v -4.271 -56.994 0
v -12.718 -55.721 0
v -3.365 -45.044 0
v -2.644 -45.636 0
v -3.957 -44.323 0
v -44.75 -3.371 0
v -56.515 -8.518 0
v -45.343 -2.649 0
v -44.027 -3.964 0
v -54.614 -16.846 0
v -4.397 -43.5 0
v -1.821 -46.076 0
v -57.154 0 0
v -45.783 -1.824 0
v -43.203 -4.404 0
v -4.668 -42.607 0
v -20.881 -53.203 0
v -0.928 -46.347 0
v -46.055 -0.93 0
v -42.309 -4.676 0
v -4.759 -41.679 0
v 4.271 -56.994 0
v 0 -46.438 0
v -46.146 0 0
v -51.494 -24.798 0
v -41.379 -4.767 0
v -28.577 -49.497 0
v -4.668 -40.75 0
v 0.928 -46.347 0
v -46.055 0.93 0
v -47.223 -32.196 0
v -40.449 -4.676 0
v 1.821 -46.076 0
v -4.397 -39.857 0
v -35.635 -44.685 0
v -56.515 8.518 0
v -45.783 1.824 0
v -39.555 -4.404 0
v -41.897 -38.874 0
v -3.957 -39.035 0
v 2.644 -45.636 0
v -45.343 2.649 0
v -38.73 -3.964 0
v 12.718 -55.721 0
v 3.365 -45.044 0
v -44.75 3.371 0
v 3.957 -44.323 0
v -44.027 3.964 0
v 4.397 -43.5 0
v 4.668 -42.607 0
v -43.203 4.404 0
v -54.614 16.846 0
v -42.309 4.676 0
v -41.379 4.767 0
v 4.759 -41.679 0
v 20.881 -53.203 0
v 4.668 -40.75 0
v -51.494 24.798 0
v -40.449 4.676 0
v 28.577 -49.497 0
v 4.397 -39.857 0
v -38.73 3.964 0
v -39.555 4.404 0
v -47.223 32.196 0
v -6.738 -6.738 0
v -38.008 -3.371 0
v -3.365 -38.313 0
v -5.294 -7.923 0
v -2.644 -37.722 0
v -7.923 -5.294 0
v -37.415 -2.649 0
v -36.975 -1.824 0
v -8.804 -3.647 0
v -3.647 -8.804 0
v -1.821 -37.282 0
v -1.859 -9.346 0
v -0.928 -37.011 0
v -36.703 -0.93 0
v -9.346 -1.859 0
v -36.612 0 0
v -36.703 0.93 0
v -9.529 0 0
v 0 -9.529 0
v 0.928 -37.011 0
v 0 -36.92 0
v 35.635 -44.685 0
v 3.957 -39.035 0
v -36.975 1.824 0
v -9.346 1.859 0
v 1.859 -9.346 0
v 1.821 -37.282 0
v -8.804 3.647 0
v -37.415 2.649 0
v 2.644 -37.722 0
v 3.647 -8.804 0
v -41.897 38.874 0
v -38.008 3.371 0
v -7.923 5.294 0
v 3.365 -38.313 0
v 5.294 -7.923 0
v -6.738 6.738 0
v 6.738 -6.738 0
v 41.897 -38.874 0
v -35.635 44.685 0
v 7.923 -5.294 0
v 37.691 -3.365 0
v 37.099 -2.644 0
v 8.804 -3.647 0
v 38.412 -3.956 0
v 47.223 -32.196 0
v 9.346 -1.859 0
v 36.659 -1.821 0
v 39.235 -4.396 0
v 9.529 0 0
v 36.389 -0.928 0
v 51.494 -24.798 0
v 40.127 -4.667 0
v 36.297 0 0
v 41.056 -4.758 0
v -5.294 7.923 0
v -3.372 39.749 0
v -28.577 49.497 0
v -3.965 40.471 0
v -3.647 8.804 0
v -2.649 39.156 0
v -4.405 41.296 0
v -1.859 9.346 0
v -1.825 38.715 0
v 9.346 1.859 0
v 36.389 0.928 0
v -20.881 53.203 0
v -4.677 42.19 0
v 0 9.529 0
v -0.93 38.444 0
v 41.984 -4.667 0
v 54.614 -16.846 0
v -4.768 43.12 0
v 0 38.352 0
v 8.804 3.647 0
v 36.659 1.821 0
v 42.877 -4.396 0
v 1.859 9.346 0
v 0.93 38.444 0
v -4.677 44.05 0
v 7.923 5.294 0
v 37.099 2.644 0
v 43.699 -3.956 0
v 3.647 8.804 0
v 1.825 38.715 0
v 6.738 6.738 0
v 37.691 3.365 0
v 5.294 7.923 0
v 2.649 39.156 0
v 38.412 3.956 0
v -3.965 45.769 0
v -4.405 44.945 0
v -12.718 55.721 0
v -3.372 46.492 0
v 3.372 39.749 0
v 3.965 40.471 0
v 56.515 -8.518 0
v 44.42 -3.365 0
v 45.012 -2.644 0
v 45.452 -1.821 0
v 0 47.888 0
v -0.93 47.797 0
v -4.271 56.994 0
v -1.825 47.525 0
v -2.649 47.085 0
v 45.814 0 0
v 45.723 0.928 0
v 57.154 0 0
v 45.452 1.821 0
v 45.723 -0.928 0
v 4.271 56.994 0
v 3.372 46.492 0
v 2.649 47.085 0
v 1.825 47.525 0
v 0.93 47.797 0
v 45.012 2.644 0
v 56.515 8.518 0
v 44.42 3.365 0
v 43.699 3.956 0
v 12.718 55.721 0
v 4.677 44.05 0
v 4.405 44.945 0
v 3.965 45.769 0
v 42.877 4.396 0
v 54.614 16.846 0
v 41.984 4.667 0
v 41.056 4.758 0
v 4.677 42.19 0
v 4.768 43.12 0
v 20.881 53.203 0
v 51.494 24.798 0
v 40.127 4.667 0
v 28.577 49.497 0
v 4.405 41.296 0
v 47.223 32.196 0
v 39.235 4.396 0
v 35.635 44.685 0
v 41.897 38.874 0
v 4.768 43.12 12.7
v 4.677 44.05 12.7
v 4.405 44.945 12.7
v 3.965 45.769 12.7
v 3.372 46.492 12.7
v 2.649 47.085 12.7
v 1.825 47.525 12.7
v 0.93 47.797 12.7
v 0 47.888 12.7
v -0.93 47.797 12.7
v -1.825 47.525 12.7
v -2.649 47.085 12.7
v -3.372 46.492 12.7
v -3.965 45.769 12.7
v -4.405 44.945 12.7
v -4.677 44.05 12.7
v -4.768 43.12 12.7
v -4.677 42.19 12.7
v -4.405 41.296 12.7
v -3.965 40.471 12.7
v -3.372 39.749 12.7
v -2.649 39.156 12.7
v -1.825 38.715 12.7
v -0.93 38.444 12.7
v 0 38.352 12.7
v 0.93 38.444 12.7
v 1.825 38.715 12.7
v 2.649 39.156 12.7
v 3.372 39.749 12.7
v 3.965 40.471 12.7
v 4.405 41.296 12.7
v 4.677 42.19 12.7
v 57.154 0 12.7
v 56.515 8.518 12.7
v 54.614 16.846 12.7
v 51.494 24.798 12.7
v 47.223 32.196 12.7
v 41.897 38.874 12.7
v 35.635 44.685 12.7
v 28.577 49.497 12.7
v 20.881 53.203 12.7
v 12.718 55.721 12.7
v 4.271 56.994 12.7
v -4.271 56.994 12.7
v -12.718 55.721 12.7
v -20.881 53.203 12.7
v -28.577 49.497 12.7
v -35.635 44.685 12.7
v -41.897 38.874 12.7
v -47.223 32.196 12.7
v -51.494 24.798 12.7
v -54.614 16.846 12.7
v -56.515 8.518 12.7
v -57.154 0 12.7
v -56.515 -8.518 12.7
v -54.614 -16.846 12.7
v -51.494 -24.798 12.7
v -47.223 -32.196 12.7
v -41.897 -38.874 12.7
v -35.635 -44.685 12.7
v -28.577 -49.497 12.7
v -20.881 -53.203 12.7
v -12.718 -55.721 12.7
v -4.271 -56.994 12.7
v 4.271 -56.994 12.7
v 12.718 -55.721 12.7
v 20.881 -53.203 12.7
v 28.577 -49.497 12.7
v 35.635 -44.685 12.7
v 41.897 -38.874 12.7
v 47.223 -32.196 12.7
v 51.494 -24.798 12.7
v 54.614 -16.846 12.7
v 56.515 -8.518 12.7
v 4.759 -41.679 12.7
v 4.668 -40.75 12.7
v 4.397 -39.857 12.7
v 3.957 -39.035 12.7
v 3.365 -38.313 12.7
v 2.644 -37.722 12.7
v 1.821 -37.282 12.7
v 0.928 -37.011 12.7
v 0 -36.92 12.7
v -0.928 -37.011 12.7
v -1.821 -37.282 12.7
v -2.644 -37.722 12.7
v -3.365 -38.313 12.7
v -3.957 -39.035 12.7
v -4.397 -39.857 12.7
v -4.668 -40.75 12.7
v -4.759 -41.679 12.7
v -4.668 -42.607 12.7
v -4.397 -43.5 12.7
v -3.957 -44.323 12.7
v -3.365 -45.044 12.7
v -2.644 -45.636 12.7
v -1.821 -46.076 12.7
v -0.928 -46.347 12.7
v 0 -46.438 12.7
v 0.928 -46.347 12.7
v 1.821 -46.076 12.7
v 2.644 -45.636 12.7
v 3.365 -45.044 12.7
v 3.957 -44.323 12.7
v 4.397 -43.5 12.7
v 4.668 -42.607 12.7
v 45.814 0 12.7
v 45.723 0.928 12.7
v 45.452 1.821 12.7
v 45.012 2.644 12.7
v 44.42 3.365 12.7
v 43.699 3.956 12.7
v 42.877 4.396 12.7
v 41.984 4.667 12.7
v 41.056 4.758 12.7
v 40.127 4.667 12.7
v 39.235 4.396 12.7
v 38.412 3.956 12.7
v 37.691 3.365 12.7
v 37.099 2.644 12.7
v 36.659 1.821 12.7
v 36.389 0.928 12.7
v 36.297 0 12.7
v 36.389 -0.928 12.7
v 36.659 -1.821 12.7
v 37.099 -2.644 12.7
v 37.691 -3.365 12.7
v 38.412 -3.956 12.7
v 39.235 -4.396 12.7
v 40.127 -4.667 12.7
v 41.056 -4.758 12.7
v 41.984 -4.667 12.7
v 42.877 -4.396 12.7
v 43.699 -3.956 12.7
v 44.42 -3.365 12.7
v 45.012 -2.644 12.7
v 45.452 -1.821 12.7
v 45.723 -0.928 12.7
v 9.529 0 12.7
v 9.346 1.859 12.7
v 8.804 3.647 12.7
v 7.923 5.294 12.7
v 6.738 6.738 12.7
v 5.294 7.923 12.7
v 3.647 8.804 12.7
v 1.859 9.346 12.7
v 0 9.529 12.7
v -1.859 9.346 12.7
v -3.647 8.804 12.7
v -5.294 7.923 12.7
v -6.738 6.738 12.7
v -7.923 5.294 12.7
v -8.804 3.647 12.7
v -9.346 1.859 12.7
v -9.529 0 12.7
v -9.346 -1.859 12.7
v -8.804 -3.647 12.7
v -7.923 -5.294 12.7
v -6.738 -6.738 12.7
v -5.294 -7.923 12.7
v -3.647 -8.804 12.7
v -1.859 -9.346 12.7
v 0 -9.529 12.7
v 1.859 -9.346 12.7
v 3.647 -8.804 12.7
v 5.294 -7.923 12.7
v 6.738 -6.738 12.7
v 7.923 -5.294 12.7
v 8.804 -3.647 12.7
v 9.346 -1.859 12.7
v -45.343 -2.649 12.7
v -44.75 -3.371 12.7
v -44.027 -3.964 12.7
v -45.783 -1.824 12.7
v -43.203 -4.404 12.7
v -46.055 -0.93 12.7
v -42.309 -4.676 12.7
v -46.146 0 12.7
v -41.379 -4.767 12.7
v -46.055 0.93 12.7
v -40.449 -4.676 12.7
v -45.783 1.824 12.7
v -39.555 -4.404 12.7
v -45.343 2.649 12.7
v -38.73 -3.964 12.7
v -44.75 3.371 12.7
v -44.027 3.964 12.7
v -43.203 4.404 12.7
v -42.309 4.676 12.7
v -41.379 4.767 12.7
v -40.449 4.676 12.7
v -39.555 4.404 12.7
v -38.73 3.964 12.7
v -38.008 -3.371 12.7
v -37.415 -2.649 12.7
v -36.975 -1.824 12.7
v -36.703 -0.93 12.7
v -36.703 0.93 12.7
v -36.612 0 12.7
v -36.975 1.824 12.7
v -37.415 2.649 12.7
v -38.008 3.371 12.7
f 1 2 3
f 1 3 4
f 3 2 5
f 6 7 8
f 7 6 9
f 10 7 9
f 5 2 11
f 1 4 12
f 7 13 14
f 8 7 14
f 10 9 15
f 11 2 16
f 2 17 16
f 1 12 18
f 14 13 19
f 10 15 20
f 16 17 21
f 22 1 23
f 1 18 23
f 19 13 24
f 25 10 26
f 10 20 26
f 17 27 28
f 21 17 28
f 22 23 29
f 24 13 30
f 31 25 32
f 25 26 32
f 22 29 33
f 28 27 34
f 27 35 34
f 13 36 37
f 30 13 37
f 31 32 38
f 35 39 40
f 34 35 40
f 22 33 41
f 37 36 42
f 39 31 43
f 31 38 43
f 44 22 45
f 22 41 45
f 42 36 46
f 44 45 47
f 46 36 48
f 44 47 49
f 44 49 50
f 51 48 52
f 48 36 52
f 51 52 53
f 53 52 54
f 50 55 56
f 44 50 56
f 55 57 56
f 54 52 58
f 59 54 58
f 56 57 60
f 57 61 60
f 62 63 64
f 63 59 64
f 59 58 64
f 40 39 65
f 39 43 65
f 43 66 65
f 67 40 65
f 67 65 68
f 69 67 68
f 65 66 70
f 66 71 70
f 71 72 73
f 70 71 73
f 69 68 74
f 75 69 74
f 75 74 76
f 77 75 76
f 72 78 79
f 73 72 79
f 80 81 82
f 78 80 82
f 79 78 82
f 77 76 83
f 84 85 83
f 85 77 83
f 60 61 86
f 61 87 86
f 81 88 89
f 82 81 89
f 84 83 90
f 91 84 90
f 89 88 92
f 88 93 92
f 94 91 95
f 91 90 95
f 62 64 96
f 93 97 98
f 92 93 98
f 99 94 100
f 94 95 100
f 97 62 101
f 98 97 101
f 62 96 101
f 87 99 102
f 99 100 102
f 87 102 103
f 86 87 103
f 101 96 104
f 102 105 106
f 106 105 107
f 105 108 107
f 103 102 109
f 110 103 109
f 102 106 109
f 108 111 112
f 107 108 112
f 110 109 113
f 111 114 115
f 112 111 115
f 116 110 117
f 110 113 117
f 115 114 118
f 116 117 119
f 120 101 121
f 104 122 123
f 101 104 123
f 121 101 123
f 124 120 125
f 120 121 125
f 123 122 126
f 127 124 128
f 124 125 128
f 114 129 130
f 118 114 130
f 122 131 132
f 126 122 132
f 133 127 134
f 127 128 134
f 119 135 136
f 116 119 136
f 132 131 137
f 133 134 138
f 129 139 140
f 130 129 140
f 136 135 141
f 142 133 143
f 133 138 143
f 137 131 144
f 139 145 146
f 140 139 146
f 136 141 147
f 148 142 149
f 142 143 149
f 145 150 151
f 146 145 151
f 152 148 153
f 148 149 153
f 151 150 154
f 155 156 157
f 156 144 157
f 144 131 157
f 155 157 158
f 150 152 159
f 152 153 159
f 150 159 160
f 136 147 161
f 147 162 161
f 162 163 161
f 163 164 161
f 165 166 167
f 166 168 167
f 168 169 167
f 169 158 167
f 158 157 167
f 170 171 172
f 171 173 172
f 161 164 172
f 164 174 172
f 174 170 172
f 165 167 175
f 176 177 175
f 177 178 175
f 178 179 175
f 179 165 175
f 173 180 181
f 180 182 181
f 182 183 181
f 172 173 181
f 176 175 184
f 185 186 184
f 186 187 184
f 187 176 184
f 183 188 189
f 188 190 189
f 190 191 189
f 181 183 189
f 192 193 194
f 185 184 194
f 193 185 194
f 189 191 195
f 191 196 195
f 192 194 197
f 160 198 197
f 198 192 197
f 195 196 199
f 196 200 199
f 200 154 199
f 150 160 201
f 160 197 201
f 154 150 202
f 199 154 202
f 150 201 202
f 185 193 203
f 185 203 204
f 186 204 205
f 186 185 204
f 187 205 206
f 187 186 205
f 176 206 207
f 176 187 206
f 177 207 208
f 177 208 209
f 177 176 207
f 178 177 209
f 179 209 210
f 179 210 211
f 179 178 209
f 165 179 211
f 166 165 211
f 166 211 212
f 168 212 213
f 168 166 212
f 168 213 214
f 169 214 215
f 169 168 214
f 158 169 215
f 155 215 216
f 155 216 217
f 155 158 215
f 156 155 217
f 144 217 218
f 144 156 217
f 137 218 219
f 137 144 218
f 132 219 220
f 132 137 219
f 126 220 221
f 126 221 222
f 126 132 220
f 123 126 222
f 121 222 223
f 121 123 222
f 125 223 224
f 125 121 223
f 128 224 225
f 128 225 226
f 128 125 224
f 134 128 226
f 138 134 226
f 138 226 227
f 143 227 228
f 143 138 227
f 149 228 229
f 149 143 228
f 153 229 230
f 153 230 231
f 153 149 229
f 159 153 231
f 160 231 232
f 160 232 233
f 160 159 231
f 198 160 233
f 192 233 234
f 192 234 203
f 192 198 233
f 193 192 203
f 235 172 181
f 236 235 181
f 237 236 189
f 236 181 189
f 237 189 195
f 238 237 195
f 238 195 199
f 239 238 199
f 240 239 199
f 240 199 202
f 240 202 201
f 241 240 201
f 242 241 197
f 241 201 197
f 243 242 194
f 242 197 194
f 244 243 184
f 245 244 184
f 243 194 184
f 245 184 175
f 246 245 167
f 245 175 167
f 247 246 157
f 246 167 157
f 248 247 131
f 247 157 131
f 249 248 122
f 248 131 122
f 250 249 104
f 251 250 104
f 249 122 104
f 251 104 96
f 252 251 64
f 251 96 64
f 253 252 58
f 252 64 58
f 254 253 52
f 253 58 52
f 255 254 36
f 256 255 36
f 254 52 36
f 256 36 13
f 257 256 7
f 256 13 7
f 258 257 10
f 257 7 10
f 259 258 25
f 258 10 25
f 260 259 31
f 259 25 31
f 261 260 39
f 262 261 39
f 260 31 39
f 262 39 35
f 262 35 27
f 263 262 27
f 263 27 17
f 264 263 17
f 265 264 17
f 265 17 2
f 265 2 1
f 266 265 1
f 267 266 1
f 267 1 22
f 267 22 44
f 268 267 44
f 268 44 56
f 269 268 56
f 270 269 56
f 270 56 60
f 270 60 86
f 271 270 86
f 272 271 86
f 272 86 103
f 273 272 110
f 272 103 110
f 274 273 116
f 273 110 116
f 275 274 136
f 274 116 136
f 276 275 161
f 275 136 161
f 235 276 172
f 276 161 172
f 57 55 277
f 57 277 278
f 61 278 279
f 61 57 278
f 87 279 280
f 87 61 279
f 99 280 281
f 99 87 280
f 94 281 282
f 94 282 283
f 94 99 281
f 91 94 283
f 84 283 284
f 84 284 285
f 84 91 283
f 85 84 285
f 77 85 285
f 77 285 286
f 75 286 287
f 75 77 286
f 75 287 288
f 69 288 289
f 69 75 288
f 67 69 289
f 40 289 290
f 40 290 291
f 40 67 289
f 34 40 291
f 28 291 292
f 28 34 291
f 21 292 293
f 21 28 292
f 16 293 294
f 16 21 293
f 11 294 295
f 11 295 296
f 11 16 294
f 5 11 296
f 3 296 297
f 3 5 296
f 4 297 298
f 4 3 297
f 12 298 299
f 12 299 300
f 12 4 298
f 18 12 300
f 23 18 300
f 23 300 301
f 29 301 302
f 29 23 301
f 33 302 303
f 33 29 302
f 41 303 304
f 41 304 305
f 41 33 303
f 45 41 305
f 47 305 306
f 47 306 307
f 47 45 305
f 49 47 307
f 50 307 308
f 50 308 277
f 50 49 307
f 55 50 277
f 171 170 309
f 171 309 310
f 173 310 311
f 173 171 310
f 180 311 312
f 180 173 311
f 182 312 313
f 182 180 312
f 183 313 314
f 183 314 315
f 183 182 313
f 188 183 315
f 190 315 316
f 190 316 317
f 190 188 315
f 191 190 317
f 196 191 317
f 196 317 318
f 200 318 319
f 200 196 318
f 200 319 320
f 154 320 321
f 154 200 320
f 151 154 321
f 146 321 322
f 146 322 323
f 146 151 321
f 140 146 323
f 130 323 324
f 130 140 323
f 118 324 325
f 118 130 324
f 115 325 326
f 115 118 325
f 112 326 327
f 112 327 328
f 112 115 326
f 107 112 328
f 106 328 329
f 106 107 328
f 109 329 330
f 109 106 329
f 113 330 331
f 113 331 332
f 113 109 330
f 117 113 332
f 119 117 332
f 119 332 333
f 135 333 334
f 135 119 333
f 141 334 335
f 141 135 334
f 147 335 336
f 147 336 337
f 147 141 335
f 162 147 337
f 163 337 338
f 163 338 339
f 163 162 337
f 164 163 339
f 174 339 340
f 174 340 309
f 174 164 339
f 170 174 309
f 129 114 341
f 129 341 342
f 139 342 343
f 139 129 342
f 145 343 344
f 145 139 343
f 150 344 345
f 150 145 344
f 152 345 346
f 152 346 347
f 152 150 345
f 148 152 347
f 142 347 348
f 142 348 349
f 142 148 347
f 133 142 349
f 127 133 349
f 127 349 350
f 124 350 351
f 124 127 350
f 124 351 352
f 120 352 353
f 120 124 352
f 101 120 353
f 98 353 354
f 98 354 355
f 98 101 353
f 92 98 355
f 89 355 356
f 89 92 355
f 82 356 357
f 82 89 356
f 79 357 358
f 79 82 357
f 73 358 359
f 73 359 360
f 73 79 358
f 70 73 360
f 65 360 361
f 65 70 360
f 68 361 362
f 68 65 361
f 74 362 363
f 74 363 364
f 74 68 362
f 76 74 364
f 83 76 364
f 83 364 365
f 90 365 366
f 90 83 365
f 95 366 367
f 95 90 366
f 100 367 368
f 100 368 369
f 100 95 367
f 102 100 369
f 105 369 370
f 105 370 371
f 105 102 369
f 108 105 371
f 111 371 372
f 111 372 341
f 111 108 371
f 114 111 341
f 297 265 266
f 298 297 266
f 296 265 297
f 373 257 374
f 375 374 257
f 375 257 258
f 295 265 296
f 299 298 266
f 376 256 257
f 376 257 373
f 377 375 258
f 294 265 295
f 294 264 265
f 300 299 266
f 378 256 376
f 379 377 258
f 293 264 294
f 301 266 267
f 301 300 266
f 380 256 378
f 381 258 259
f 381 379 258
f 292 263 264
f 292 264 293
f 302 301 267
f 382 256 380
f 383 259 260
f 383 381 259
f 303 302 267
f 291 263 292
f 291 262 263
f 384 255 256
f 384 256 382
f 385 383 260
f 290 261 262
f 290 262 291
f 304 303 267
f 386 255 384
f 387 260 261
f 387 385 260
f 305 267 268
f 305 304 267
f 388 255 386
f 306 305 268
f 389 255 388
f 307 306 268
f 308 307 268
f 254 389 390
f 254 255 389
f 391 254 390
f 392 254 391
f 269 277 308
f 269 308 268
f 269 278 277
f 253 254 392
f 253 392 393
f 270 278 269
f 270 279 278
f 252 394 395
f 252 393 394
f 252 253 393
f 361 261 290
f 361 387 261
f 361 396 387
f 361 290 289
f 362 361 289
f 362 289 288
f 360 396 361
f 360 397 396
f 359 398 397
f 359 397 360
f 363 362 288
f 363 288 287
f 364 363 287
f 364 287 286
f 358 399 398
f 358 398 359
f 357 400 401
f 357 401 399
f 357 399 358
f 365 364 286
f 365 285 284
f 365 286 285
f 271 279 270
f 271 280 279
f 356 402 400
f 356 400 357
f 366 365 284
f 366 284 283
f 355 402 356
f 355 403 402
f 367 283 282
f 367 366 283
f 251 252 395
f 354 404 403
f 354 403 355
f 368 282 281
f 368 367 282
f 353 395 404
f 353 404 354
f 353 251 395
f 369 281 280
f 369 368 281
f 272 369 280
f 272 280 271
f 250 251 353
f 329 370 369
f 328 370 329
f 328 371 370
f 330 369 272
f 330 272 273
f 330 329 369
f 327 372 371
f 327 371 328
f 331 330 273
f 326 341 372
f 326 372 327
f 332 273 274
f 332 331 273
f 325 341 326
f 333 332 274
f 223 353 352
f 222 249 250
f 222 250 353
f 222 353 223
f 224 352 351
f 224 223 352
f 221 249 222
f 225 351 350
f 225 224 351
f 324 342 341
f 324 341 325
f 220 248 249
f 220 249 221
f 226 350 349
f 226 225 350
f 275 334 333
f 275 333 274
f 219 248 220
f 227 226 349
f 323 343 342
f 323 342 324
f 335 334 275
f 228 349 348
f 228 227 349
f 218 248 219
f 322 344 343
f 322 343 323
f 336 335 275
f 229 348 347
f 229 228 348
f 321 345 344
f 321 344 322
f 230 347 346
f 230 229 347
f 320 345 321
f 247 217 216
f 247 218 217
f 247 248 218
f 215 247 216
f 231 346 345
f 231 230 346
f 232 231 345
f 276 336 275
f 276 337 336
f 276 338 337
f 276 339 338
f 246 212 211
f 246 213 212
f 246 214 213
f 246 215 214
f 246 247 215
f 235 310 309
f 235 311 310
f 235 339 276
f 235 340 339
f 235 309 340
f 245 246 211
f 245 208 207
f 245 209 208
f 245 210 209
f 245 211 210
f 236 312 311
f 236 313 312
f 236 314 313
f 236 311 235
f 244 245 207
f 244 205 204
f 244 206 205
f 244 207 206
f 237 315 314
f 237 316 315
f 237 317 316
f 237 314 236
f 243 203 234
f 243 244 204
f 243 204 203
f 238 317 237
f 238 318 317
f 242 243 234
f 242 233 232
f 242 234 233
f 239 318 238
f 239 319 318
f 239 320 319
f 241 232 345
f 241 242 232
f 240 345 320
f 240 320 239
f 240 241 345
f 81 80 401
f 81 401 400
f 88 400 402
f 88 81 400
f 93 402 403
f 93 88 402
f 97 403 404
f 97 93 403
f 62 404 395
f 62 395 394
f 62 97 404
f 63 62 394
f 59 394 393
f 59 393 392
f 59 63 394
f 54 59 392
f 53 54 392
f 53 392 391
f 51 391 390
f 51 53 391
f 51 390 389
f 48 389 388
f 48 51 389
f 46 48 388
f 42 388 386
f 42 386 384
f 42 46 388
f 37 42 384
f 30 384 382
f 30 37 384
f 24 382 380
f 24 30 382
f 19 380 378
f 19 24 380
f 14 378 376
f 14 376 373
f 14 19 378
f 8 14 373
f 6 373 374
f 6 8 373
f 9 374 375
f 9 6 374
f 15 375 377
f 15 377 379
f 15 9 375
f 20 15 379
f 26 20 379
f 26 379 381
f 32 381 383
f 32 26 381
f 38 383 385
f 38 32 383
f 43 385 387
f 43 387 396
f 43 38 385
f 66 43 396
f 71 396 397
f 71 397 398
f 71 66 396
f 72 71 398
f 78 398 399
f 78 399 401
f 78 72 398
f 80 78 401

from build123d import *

# Parameters (mm, degrees)
F0_R     = 57.153655
F0_R_2   = 4.759266
F0_R_3   = 4.767274
F0_R_4   = 9.529019
F0_R_5   = 4.758407
F0_R_6   = 4.76816
F1_DEPTH = 12.7


with BuildPart() as f1:
    # F0 (on Top) → F1 (new body)
    with BuildSketch(Plane.XY):
        Circle(F0_R)
        with Locations((0, -41.678783)):
            Circle(F0_R_2, mode=Mode.SUBTRACT)
        with Locations((-41.378908, 0)):
            Circle(F0_R_3, mode=Mode.SUBTRACT)
        Circle(F0_R_4, mode=Mode.SUBTRACT)
        with Locations((41.055638, 0)):
            Circle(F0_R_5, mode=Mode.SUBTRACT)
        with Locations((0, 43.120254)):
            Circle(F0_R_6, mode=Mode.SUBTRACT)
    extrude(amount=F1_DEPTH)


solid = f1.part
